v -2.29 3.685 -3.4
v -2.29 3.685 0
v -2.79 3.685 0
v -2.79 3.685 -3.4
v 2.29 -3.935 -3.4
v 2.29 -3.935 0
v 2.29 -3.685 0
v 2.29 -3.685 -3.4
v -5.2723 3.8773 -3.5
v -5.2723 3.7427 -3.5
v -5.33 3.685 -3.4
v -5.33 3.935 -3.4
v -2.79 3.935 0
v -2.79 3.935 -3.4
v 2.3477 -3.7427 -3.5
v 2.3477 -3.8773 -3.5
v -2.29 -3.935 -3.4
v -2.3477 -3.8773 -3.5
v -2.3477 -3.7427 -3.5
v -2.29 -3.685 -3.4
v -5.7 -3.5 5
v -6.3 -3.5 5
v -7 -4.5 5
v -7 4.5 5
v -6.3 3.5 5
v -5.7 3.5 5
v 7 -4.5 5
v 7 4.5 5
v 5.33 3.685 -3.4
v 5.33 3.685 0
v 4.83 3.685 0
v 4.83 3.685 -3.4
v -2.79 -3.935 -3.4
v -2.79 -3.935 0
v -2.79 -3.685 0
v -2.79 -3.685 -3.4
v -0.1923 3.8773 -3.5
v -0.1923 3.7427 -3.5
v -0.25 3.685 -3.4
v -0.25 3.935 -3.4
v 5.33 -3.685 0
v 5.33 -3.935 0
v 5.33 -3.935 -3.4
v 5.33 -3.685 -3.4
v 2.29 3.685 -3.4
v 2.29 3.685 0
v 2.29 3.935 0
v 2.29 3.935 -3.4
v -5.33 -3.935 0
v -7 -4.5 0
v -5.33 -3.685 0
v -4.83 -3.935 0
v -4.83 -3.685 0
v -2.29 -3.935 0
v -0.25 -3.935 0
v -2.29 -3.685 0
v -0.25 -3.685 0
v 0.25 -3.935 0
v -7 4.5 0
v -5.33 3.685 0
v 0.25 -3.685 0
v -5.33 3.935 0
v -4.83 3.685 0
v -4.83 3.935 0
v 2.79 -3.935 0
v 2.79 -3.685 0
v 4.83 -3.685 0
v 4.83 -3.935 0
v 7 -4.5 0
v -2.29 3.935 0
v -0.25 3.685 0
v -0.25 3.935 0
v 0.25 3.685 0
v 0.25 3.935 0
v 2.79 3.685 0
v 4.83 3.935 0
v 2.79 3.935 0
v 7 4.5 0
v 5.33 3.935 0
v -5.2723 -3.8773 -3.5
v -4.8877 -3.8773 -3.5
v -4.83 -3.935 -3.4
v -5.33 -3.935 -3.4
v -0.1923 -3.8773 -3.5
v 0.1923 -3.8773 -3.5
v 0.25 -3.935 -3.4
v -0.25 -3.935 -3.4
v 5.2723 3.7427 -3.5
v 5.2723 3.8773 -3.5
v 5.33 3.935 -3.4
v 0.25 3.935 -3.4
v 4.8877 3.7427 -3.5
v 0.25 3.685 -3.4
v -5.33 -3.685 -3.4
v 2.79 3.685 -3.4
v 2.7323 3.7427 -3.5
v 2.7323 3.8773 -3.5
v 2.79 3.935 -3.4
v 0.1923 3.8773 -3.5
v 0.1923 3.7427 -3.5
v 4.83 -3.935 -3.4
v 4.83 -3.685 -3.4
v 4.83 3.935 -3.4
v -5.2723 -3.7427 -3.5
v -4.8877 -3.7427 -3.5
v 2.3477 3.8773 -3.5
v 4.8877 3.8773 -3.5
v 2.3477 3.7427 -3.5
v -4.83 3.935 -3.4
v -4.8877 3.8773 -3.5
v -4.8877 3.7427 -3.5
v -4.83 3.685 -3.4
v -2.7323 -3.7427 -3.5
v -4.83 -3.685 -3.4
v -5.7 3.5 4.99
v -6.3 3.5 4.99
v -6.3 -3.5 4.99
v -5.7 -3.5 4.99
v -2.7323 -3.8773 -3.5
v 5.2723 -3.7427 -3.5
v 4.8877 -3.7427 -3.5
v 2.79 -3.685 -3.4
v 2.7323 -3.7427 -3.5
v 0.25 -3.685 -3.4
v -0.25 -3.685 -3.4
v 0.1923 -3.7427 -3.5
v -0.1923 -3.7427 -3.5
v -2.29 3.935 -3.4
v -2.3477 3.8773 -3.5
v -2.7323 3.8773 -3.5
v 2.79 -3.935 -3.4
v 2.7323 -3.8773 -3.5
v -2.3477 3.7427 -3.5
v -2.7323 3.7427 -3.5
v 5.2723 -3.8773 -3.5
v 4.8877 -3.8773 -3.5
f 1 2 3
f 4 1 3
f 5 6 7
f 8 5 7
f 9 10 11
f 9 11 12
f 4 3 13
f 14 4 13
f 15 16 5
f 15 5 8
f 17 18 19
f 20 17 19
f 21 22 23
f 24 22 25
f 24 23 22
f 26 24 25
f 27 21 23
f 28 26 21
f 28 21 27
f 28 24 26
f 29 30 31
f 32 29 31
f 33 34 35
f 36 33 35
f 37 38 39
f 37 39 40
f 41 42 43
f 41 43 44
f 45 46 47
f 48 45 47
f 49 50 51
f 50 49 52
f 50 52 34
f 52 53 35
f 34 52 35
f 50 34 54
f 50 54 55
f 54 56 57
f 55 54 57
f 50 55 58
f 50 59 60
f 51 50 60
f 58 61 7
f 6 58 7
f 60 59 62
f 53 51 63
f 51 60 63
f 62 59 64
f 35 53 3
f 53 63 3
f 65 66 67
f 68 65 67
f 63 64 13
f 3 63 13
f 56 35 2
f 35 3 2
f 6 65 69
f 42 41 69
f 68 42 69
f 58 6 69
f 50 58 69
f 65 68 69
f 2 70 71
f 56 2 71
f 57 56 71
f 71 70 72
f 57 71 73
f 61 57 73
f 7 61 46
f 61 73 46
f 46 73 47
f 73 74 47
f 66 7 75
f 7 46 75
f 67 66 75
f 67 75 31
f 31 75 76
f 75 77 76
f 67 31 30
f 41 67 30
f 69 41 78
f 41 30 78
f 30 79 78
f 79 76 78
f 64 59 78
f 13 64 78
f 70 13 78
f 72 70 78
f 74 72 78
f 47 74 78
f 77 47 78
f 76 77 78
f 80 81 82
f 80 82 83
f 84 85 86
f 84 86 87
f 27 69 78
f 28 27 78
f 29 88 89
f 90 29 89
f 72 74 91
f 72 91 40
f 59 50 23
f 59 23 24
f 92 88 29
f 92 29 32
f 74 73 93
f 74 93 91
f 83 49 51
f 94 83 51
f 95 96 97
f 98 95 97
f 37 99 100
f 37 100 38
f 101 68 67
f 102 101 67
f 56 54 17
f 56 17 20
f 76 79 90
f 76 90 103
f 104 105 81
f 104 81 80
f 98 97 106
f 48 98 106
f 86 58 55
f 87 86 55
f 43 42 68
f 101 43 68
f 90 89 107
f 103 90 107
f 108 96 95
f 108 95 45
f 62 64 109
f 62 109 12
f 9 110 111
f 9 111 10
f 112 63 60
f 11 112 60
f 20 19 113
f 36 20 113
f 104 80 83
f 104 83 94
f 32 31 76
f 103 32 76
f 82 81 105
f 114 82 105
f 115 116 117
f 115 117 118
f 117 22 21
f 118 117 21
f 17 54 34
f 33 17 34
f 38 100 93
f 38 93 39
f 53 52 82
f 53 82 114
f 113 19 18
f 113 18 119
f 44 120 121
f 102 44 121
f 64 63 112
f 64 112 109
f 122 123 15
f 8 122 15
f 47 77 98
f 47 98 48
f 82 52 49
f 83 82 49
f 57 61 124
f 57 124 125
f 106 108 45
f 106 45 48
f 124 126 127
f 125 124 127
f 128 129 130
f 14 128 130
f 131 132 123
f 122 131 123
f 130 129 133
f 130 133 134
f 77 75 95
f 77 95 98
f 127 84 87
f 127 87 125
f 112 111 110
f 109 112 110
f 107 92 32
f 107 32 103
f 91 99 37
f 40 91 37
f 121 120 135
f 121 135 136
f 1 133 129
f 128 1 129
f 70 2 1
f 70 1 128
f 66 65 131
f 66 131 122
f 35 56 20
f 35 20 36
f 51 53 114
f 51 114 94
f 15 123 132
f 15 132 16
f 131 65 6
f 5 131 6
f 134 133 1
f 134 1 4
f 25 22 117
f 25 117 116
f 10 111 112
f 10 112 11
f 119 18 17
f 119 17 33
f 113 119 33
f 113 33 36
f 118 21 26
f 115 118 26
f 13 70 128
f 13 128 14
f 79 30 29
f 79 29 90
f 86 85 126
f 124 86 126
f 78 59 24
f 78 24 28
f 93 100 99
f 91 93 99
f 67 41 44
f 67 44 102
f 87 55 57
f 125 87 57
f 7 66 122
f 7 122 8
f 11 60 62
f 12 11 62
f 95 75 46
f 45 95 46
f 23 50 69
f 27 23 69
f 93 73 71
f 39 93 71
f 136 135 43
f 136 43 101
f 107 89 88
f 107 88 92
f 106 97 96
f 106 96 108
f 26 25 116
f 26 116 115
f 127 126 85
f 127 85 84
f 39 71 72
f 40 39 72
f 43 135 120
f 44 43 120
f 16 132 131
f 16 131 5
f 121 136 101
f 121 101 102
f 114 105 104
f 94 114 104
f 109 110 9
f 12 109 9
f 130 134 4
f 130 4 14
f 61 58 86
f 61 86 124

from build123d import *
from OCP.BRepFilletAPI import BRepFilletAPI_MakeChamfer

# Parameters (mm, degrees)
SKETCH_1_W                          = 14
SKETCH_1_H                          = 9
EXTRUDE_1_DEPTH                     = 5
SKETCH_3_W                          = 0.6
SKETCH_3_H                          = 7
CUT_EXTRUDE_1_DEPTH                 = 0.01
SKETCH_4_W                          = 0.5
SKETCH_4_H                          = 0.25
EXTRUDE_2_DEPTH                     = 3.5
CHAMFER_1_SIZE                      = 0.1
CHAMFER_1_SIZE2                     = 0.057735027
PATTERN_LINEAR_1_COUNT              = 5
PATTERN_LINEAR_1_PITCH              = 2.54
PATTERN_LINEAR_1_COUNT_DIR2         = 2
PATTERN_LINEAR_1_PITCH_DIR2         = 7.62
CHAMFER_1_OF_PATTERN_LINEAR_1_SIZE  = 0.1
CHAMFER_1_OF_PATTERN_LINEAR_1_SIZE2 = 0.057735027


with BuildPart() as part:
    # Эскиз1 → Бобышка-Вытянуть1 (new body)
    with BuildSketch(Plane.XY):
        Rectangle(SKETCH_1_W, SKETCH_1_H)
    extrude(amount=EXTRUDE_1_DEPTH)

    # Эскиз3 → Вырез-Вытянуть1 (cut)
    with BuildSketch(Plane.XY.offset(5)):
        with Locations((-6, 0)):
            Rectangle(SKETCH_3_W, SKETCH_3_H)
    extrude(amount=-CUT_EXTRUDE_1_DEPTH, mode=Mode.SUBTRACT)

    # Эскиз4 → Бобышка-Вытянуть2 (add)
    with BuildSketch(Plane(origin=(0, 0, 0), x_dir=(-1, 0, 0), z_dir=(0, 0, -1))):
        with Locations((5.08, -3.81)):
            Rectangle(SKETCH_4_W, SKETCH_4_H)
    extrude_2 = extrude(amount=EXTRUDE_2_DEPTH)

    # Фаска1: one chamfer whose edges measure the first distance from different faces: ONE call of the kernel's chamfer builder (chamfer() names one face for all edges)
    chamfer_1_edges_1 = [part.edges().sort_by_distance(p)[0] for p in [
        (-4.83, -3.81, -3.5),
    ]]
    chamfer_1_side_1 = [part.faces().sort_by_distance(p)[0] for p in [
        (-4.83, -3.81, -1.75),
    ]]
    chamfer_1_edges_2 = [part.edges().sort_by_distance(p)[0] for p in [
        (-5.08, -3.935, -3.5),
    ]]
    chamfer_1_side_2 = [part.faces().sort_by_distance(p)[0] for p in [
        (-5.08, -3.935, -1.75),
    ]]
    chamfer_1_edges_3 = [part.edges().sort_by_distance(p)[0] for p in [
        (-5.33, -3.81, -3.5),
    ]]
    chamfer_1_side_3 = [part.faces().sort_by_distance(p)[0] for p in [
        (-5.33, -3.81, -1.75),
    ]]
    chamfer_1_edges_4 = [part.edges().sort_by_distance(p)[0] for p in [
        (-5.08, -3.685, -3.5),
    ]]
    chamfer_1_side_4 = [part.faces().sort_by_distance(p)[0] for p in [
        (-5.08, -3.685, -1.75),
    ]]
    chamfer_1 = BRepFilletAPI_MakeChamfer(part.part.solid().wrapped)
    for e in chamfer_1_edges_1:
        chamfer_1.Add(CHAMFER_1_SIZE, CHAMFER_1_SIZE2, e.wrapped, chamfer_1_side_1[0].wrapped)  # the first distance lies on this face
    for e in chamfer_1_edges_2:
        chamfer_1.Add(CHAMFER_1_SIZE, CHAMFER_1_SIZE2, e.wrapped, chamfer_1_side_2[0].wrapped)  # the first distance lies on this face
    for e in chamfer_1_edges_3:
        chamfer_1.Add(CHAMFER_1_SIZE, CHAMFER_1_SIZE2, e.wrapped, chamfer_1_side_3[0].wrapped)  # the first distance lies on this face
    for e in chamfer_1_edges_4:
        chamfer_1.Add(CHAMFER_1_SIZE, CHAMFER_1_SIZE2, e.wrapped, chamfer_1_side_4[0].wrapped)  # the first distance lies on this face
    add(Compound.cast(chamfer_1.Shape()), mode=Mode.REPLACE)

    # Линейный массив1: Extrude 2 5 × 2
    with Locations(*[(i * PATTERN_LINEAR_1_PITCH, j * PATTERN_LINEAR_1_PITCH_DIR2, 0) for i in range(PATTERN_LINEAR_1_COUNT) for j in range(PATTERN_LINEAR_1_COUNT_DIR2) if (i, j) != (0, 0)]):
        add(extrude_2)

    # Фаска1 of Линейный массив1: one chamfer whose edges measure the first distance from different faces: ONE call of the kernel's chamfer builder (chamfer() names one face for all edges)
    chamfer_1_of_pattern_linear_1_edges_1 = [part.edges().sort_by_distance(p)[0] for p in [
        (-4.83, 3.81, -3.5),
    ]]
    chamfer_1_of_pattern_linear_1_side_1 = [part.faces().sort_by_distance(p)[0] for p in [
        (-4.83, 3.81, -1.75),
    ]]
    chamfer_1_of_pattern_linear_1_edges_2 = [part.edges().sort_by_distance(p)[0] for p in [
        (-5.08, 3.685, -3.5),
    ]]
    chamfer_1_of_pattern_linear_1_side_2 = [part.faces().sort_by_distance(p)[0] for p in [
        (-5.08, 3.685, -1.75),
    ]]
    chamfer_1_of_pattern_linear_1_edges_3 = [part.edges().sort_by_distance(p)[0] for p in [
        (-5.33, 3.81, -3.5),
    ]]
    chamfer_1_of_pattern_linear_1_side_3 = [part.faces().sort_by_distance(p)[0] for p in [
        (-5.33, 3.81, -1.75),
    ]]
    chamfer_1_of_pattern_linear_1_edges_4 = [part.edges().sort_by_distance(p)[0] for p in [
        (-5.08, 3.935, -3.5),
    ]]
    chamfer_1_of_pattern_linear_1_side_4 = [part.faces().sort_by_distance(p)[0] for p in [
        (-5.08, 3.935, -1.75),
    ]]
    chamfer_1_of_pattern_linear_1_edges_5 = [part.edges().sort_by_distance(p)[0] for p in [
        (-2.29, -3.81, -3.5),
    ]]
    chamfer_1_of_pattern_linear_1_side_5 = [part.faces().sort_by_distance(p)[0] for p in [
        (-2.29, -3.81, -1.75),
    ]]
    chamfer_1_of_pattern_linear_1_edges_6 = [part.edges().sort_by_distance(p)[0] for p in [
        (-2.54, -3.935, -3.5),
    ]]
    chamfer_1_of_pattern_linear_1_side_6 = [part.faces().sort_by_distance(p)[0] for p in [
        (-2.54, -3.935, -1.75),
    ]]
    chamfer_1_of_pattern_linear_1_edges_7 = [part.edges().sort_by_distance(p)[0] for p in [
        (-2.79, -3.81, -3.5),
    ]]
    chamfer_1_of_pattern_linear_1_side_7 = [part.faces().sort_by_distance(p)[0] for p in [
        (-2.79, -3.81, -1.75),
    ]]
    chamfer_1_of_pattern_linear_1_edges_8 = [part.edges().sort_by_distance(p)[0] for p in [
        (-2.54, -3.685, -3.5),
    ]]
    chamfer_1_of_pattern_linear_1_side_8 = [part.faces().sort_by_distance(p)[0] for p in [
        (-2.54, -3.685, -1.75),
    ]]
    chamfer_1_of_pattern_linear_1_edges_9 = [part.edges().sort_by_distance(p)[0] for p in [
        (-2.29, 3.81, -3.5),
    ]]
    chamfer_1_of_pattern_linear_1_side_9 = [part.faces().sort_by_distance(p)[0] for p in [
        (-2.29, 3.81, -1.75),
    ]]
    chamfer_1_of_pattern_linear_1_edges_10 = [part.edges().sort_by_distance(p)[0] for p in [
        (-2.54, 3.685, -3.5),
    ]]
    chamfer_1_of_pattern_linear_1_side_10 = [part.faces().sort_by_distance(p)[0] for p in [
        (-2.54, 3.685, -1.75),
    ]]
    chamfer_1_of_pattern_linear_1_edges_11 = [part.edges().sort_by_distance(p)[0] for p in [
        (-2.79, 3.81, -3.5),
    ]]
    chamfer_1_of_pattern_linear_1_side_11 = [part.faces().sort_by_distance(p)[0] for p in [
        (-2.79, 3.81, -1.75),
    ]]
    chamfer_1_of_pattern_linear_1_edges_12 = [part.edges().sort_by_distance(p)[0] for p in [
        (-2.54, 3.935, -3.5),
    ]]
    chamfer_1_of_pattern_linear_1_side_12 = [part.faces().sort_by_distance(p)[0] for p in [
        (-2.54, 3.935, -1.75),
    ]]
    chamfer_1_of_pattern_linear_1_edges_13 = [part.edges().sort_by_distance(p)[0] for p in [
        (0.25, -3.81, -3.5),
    ]]
    chamfer_1_of_pattern_linear_1_side_13 = [part.faces().sort_by_distance(p)[0] for p in [
        (0.25, -3.81, -1.75),
    ]]
    chamfer_1_of_pattern_linear_1_edges_14 = [part.edges().sort_by_distance(p)[0] for p in [
        (0, -3.935, -3.5),
    ]]
    chamfer_1_of_pattern_linear_1_side_14 = [part.faces().sort_by_distance(p)[0] for p in [
        (0, -3.935, -1.75),
    ]]
    chamfer_1_of_pattern_linear_1_edges_15 = [part.edges().sort_by_distance(p)[0] for p in [
        (-0.25, -3.81, -3.5),
    ]]
    chamfer_1_of_pattern_linear_1_side_15 = [part.faces().sort_by_distance(p)[0] for p in [
        (-0.25, -3.81, -1.75),
    ]]
    chamfer_1_of_pattern_linear_1_edges_16 = [part.edges().sort_by_distance(p)[0] for p in [
        (0, -3.685, -3.5),
    ]]
    chamfer_1_of_pattern_linear_1_side_16 = [part.faces().sort_by_distance(p)[0] for p in [
        (0, -3.685, -1.75),
    ]]
    chamfer_1_of_pattern_linear_1_edges_17 = [part.edges().sort_by_distance(p)[0] for p in [
        (0.25, 3.81, -3.5),
    ]]
    chamfer_1_of_pattern_linear_1_side_17 = [part.faces().sort_by_distance(p)[0] for p in [
        (0.25, 3.81, -1.75),
    ]]
    chamfer_1_of_pattern_linear_1_edges_18 = [part.edges().sort_by_distance(p)[0] for p in [
        (0, 3.685, -3.5),
    ]]
    chamfer_1_of_pattern_linear_1_side_18 = [part.faces().sort_by_distance(p)[0] for p in [
        (0, 3.685, -1.75),
    ]]
    chamfer_1_of_pattern_linear_1_edges_19 = [part.edges().sort_by_distance(p)[0] for p in [
        (-0.25, 3.81, -3.5),
    ]]
    chamfer_1_of_pattern_linear_1_side_19 = [part.faces().sort_by_distance(p)[0] for p in [
        (-0.25, 3.81, -1.75),
    ]]
    chamfer_1_of_pattern_linear_1_edges_20 = [part.edges().sort_by_distance(p)[0] for p in [
        (0, 3.935, -3.5),
    ]]
    chamfer_1_of_pattern_linear_1_side_20 = [part.faces().sort_by_distance(p)[0] for p in [
        (0, 3.935, -1.75),
    ]]
    chamfer_1_of_pattern_linear_1_edges_21 = [part.edges().sort_by_distance(p)[0] for p in [
        (2.79, -3.81, -3.5),
    ]]
    chamfer_1_of_pattern_linear_1_side_21 = [part.faces().sort_by_distance(p)[0] for p in [
        (2.79, -3.81, -1.75),
    ]]
    chamfer_1_of_pattern_linear_1_edges_22 = [part.edges().sort_by_distance(p)[0] for p in [
        (2.54, -3.935, -3.5),
    ]]
    chamfer_1_of_pattern_linear_1_side_22 = [part.faces().sort_by_distance(p)[0] for p in [
        (2.54, -3.935, -1.75),
    ]]
    chamfer_1_of_pattern_linear_1_edges_23 = [part.edges().sort_by_distance(p)[0] for p in [
        (2.29, -3.81, -3.5),
    ]]
    chamfer_1_of_pattern_linear_1_side_23 = [part.faces().sort_by_distance(p)[0] for p in [
        (2.29, -3.81, -1.75),
    ]]
    chamfer_1_of_pattern_linear_1_edges_24 = [part.edges().sort_by_distance(p)[0] for p in [
        (2.54, -3.685, -3.5),
    ]]
    chamfer_1_of_pattern_linear_1_side_24 = [part.faces().sort_by_distance(p)[0] for p in [
        (2.54, -3.685, -1.75),
    ]]
    chamfer_1_of_pattern_linear_1_edges_25 = [part.edges().sort_by_distance(p)[0] for p in [
        (2.79, 3.81, -3.5),
    ]]
    chamfer_1_of_pattern_linear_1_side_25 = [part.faces().sort_by_distance(p)[0] for p in [
        (2.79, 3.81, -1.75),
    ]]
    chamfer_1_of_pattern_linear_1_edges_26 = [part.edges().sort_by_distance(p)[0] for p in [
        (2.54, 3.685, -3.5),
    ]]
    chamfer_1_of_pattern_linear_1_side_26 = [part.faces().sort_by_distance(p)[0] for p in [
        (2.54, 3.685, -1.75),
    ]]
    chamfer_1_of_pattern_linear_1_edges_27 = [part.edges().sort_by_distance(p)[0] for p in [
        (2.29, 3.81, -3.5),
    ]]
    chamfer_1_of_pattern_linear_1_side_27 = [part.faces().sort_by_distance(p)[0] for p in [
        (2.29, 3.81, -1.75),
    ]]
    chamfer_1_of_pattern_linear_1_edges_28 = [part.edges().sort_by_distance(p)[0] for p in [
        (2.54, 3.935, -3.5),
    ]]
    chamfer_1_of_pattern_linear_1_side_28 = [part.faces().sort_by_distance(p)[0] for p in [
        (2.54, 3.935, -1.75),
    ]]
    chamfer_1_of_pattern_linear_1_edges_29 = [part.edges().sort_by_distance(p)[0] for p in [
        (5.33, -3.81, -3.5),
    ]]
    chamfer_1_of_pattern_linear_1_side_29 = [part.faces().sort_by_distance(p)[0] for p in [
        (5.33, -3.81, -1.75),
    ]]
    chamfer_1_of_pattern_linear_1_edges_30 = [part.edges().sort_by_distance(p)[0] for p in [
        (5.08, -3.935, -3.5),
    ]]
    chamfer_1_of_pattern_linear_1_side_30 = [part.faces().sort_by_distance(p)[0] for p in [
        (5.08, -3.935, -1.75),
    ]]
    chamfer_1_of_pattern_linear_1_edges_31 = [part.edges().sort_by_distance(p)[0] for p in [
        (4.83, -3.81, -3.5),
    ]]
    chamfer_1_of_pattern_linear_1_side_31 = [part.faces().sort_by_distance(p)[0] for p in [
        (4.83, -3.81, -1.75),
    ]]
    chamfer_1_of_pattern_linear_1_edges_32 = [part.edges().sort_by_distance(p)[0] for p in [
        (5.08, -3.685, -3.5),
    ]]
    chamfer_1_of_pattern_linear_1_side_32 = [part.faces().sort_by_distance(p)[0] for p in [
        (5.08, -3.685, -1.75),
    ]]
    chamfer_1_of_pattern_linear_1_edges_33 = [part.edges().sort_by_distance(p)[0] for p in [
        (5.33, 3.81, -3.5),
    ]]
    chamfer_1_of_pattern_linear_1_side_33 = [part.faces().sort_by_distance(p)[0] for p in [
        (5.33, 3.81, -1.75),
    ]]
    chamfer_1_of_pattern_linear_1_edges_34 = [part.edges().sort_by_distance(p)[0] for p in [
        (5.08, 3.685, -3.5),
    ]]
    chamfer_1_of_pattern_linear_1_side_34 = [part.faces().sort_by_distance(p)[0] for p in [
        (5.08, 3.685, -1.75),
    ]]
    chamfer_1_of_pattern_linear_1_edges_35 = [part.edges().sort_by_distance(p)[0] for p in [
        (4.83, 3.81, -3.5),
    ]]
    chamfer_1_of_pattern_linear_1_side_35 = [part.faces().sort_by_distance(p)[0] for p in [
        (4.83, 3.81, -1.75),
    ]]
    chamfer_1_of_pattern_linear_1_edges_36 = [part.edges().sort_by_distance(p)[0] for p in [
        (5.08, 3.935, -3.5),
    ]]
    chamfer_1_of_pattern_linear_1_side_36 = [part.faces().sort_by_distance(p)[0] for p in [
        (5.08, 3.935, -1.75),
    ]]
    chamfer_1_of_pattern_linear_1 = BRepFilletAPI_MakeChamfer(part.part.solid().wrapped)
    for e in chamfer_1_of_pattern_linear_1_edges_1:
        chamfer_1_of_pattern_linear_1.Add(CHAMFER_1_OF_PATTERN_LINEAR_1_SIZE, CHAMFER_1_OF_PATTERN_LINEAR_1_SIZE2, e.wrapped, chamfer_1_of_pattern_linear_1_side_1[0].wrapped)  # the first distance lies on this face
    for e in chamfer_1_of_pattern_linear_1_edges_2:
        chamfer_1_of_pattern_linear_1.Add(CHAMFER_1_OF_PATTERN_LINEAR_1_SIZE, CHAMFER_1_OF_PATTERN_LINEAR_1_SIZE2, e.wrapped, chamfer_1_of_pattern_linear_1_side_2[0].wrapped)  # the first distance lies on this face
    for e in chamfer_1_of_pattern_linear_1_edges_3:
        chamfer_1_of_pattern_linear_1.Add(CHAMFER_1_OF_PATTERN_LINEAR_1_SIZE, CHAMFER_1_OF_PATTERN_LINEAR_1_SIZE2, e.wrapped, chamfer_1_of_pattern_linear_1_side_3[0].wrapped)  # the first distance lies on this face
    for e in chamfer_1_of_pattern_linear_1_edges_4:
        chamfer_1_of_pattern_linear_1.Add(CHAMFER_1_OF_PATTERN_LINEAR_1_SIZE, CHAMFER_1_OF_PATTERN_LINEAR_1_SIZE2, e.wrapped, chamfer_1_of_pattern_linear_1_side_4[0].wrapped)  # the first distance lies on this face
    for e in chamfer_1_of_pattern_linear_1_edges_5:
        chamfer_1_of_pattern_linear_1.Add(CHAMFER_1_OF_PATTERN_LINEAR_1_SIZE, CHAMFER_1_OF_PATTERN_LINEAR_1_SIZE2, e.wrapped, chamfer_1_of_pattern_linear_1_side_5[0].wrapped)  # the first distance lies on this face
    for e in chamfer_1_of_pattern_linear_1_edges_6:
        chamfer_1_of_pattern_linear_1.Add(CHAMFER_1_OF_PATTERN_LINEAR_1_SIZE, CHAMFER_1_OF_PATTERN_LINEAR_1_SIZE2, e.wrapped, chamfer_1_of_pattern_linear_1_side_6[0].wrapped)  # the first distance lies on this face
    for e in chamfer_1_of_pattern_linear_1_edges_7:
        chamfer_1_of_pattern_linear_1.Add(CHAMFER_1_OF_PATTERN_LINEAR_1_SIZE, CHAMFER_1_OF_PATTERN_LINEAR_1_SIZE2, e.wrapped, chamfer_1_of_pattern_linear_1_side_7[0].wrapped)  # the first distance lies on this face
    for e in chamfer_1_of_pattern_linear_1_edges_8:
        chamfer_1_of_pattern_linear_1.Add(CHAMFER_1_OF_PATTERN_LINEAR_1_SIZE, CHAMFER_1_OF_PATTERN_LINEAR_1_SIZE2, e.wrapped, chamfer_1_of_pattern_linear_1_side_8[0].wrapped)  # the first distance lies on this face
    for e in chamfer_1_of_pattern_linear_1_edges_9:
        chamfer_1_of_pattern_linear_1.Add(CHAMFER_1_OF_PATTERN_LINEAR_1_SIZE, CHAMFER_1_OF_PATTERN_LINEAR_1_SIZE2, e.wrapped, chamfer_1_of_pattern_linear_1_side_9[0].wrapped)  # the first distance lies on this face
    for e in chamfer_1_of_pattern_linear_1_edges_10:
        chamfer_1_of_pattern_linear_1.Add(CHAMFER_1_OF_PATTERN_LINEAR_1_SIZE, CHAMFER_1_OF_PATTERN_LINEAR_1_SIZE2, e.wrapped, chamfer_1_of_pattern_linear_1_side_10[0].wrapped)  # the first distance lies on this face
    for e in chamfer_1_of_pattern_linear_1_edges_11:
        chamfer_1_of_pattern_linear_1.Add(CHAMFER_1_OF_PATTERN_LINEAR_1_SIZE, CHAMFER_1_OF_PATTERN_LINEAR_1_SIZE2, e.wrapped, chamfer_1_of_pattern_linear_1_side_11[0].wrapped)  # the first distance lies on this face
    for e in chamfer_1_of_pattern_linear_1_edges_12:
        chamfer_1_of_pattern_linear_1.Add(CHAMFER_1_OF_PATTERN_LINEAR_1_SIZE, CHAMFER_1_OF_PATTERN_LINEAR_1_SIZE2, e.wrapped, chamfer_1_of_pattern_linear_1_side_12[0].wrapped)  # the first distance lies on this face
    for e in chamfer_1_of_pattern_linear_1_edges_13:
        chamfer_1_of_pattern_linear_1.Add(CHAMFER_1_OF_PATTERN_LINEAR_1_SIZE, CHAMFER_1_OF_PATTERN_LINEAR_1_SIZE2, e.wrapped, chamfer_1_of_pattern_linear_1_side_13[0].wrapped)  # the first distance lies on this face
    for e in chamfer_1_of_pattern_linear_1_edges_14:
        chamfer_1_of_pattern_linear_1.Add(CHAMFER_1_OF_PATTERN_LINEAR_1_SIZE, CHAMFER_1_OF_PATTERN_LINEAR_1_SIZE2, e.wrapped, chamfer_1_of_pattern_linear_1_side_14[0].wrapped)  # the first distance lies on this face
    for e in chamfer_1_of_pattern_linear_1_edges_15:
        chamfer_1_of_pattern_linear_1.Add(CHAMFER_1_OF_PATTERN_LINEAR_1_SIZE, CHAMFER_1_OF_PATTERN_LINEAR_1_SIZE2, e.wrapped, chamfer_1_of_pattern_linear_1_side_15[0].wrapped)  # the first distance lies on this face
    for e in chamfer_1_of_pattern_linear_1_edges_16:
        chamfer_1_of_pattern_linear_1.Add(CHAMFER_1_OF_PATTERN_LINEAR_1_SIZE, CHAMFER_1_OF_PATTERN_LINEAR_1_SIZE2, e.wrapped, chamfer_1_of_pattern_linear_1_side_16[0].wrapped)  # the first distance lies on this face
    for e in chamfer_1_of_pattern_linear_1_edges_17:
        chamfer_1_of_pattern_linear_1.Add(CHAMFER_1_OF_PATTERN_LINEAR_1_SIZE, CHAMFER_1_OF_PATTERN_LINEAR_1_SIZE2, e.wrapped, chamfer_1_of_pattern_linear_1_side_17[0].wrapped)  # the first distance lies on this face
    for e in chamfer_1_of_pattern_linear_1_edges_18:
        chamfer_1_of_pattern_linear_1.Add(CHAMFER_1_OF_PATTERN_LINEAR_1_SIZE, CHAMFER_1_OF_PATTERN_LINEAR_1_SIZE2, e.wrapped, chamfer_1_of_pattern_linear_1_side_18[0].wrapped)  # the first distance lies on this face
    for e in chamfer_1_of_pattern_linear_1_edges_19:
        chamfer_1_of_pattern_linear_1.Add(CHAMFER_1_OF_PATTERN_LINEAR_1_SIZE, CHAMFER_1_OF_PATTERN_LINEAR_1_SIZE2, e.wrapped, chamfer_1_of_pattern_linear_1_side_19[0].wrapped)  # the first distance lies on this face
    for e in chamfer_1_of_pattern_linear_1_edges_20:
        chamfer_1_of_pattern_linear_1.Add(CHAMFER_1_OF_PATTERN_LINEAR_1_SIZE, CHAMFER_1_OF_PATTERN_LINEAR_1_SIZE2, e.wrapped, chamfer_1_of_pattern_linear_1_side_20[0].wrapped)  # the first distance lies on this face
    for e in chamfer_1_of_pattern_linear_1_edges_21:
        chamfer_1_of_pattern_linear_1.Add(CHAMFER_1_OF_PATTERN_LINEAR_1_SIZE, CHAMFER_1_OF_PATTERN_LINEAR_1_SIZE2, e.wrapped, chamfer_1_of_pattern_linear_1_side_21[0].wrapped)  # the first distance lies on this face
    for e in chamfer_1_of_pattern_linear_1_edges_22:
        chamfer_1_of_pattern_linear_1.Add(CHAMFER_1_OF_PATTERN_LINEAR_1_SIZE, CHAMFER_1_OF_PATTERN_LINEAR_1_SIZE2, e.wrapped, chamfer_1_of_pattern_linear_1_side_22[0].wrapped)  # the first distance lies on this face
    for e in chamfer_1_of_pattern_linear_1_edges_23:
        chamfer_1_of_pattern_linear_1.Add(CHAMFER_1_OF_PATTERN_LINEAR_1_SIZE, CHAMFER_1_OF_PATTERN_LINEAR_1_SIZE2, e.wrapped, chamfer_1_of_pattern_linear_1_side_23[0].wrapped)  # the first distance lies on this face
    for e in chamfer_1_of_pattern_linear_1_edges_24:
        chamfer_1_of_pattern_linear_1.Add(CHAMFER_1_OF_PATTERN_LINEAR_1_SIZE, CHAMFER_1_OF_PATTERN_LINEAR_1_SIZE2, e.wrapped, chamfer_1_of_pattern_linear_1_side_24[0].wrapped)  # the first distance lies on this face
    for e in chamfer_1_of_pattern_linear_1_edges_25:
        chamfer_1_of_pattern_linear_1.Add(CHAMFER_1_OF_PATTERN_LINEAR_1_SIZE, CHAMFER_1_OF_PATTERN_LINEAR_1_SIZE2, e.wrapped, chamfer_1_of_pattern_linear_1_side_25[0].wrapped)  # the first distance lies on this face
    for e in chamfer_1_of_pattern_linear_1_edges_26:
        chamfer_1_of_pattern_linear_1.Add(CHAMFER_1_OF_PATTERN_LINEAR_1_SIZE, CHAMFER_1_OF_PATTERN_LINEAR_1_SIZE2, e.wrapped, chamfer_1_of_pattern_linear_1_side_26[0].wrapped)  # the first distance lies on this face
    for e in chamfer_1_of_pattern_linear_1_edges_27:
        chamfer_1_of_pattern_linear_1.Add(CHAMFER_1_OF_PATTERN_LINEAR_1_SIZE, CHAMFER_1_OF_PATTERN_LINEAR_1_SIZE2, e.wrapped, chamfer_1_of_pattern_linear_1_side_27[0].wrapped)  # the first distance lies on this face
    for e in chamfer_1_of_pattern_linear_1_edges_28:
        chamfer_1_of_pattern_linear_1.Add(CHAMFER_1_OF_PATTERN_LINEAR_1_SIZE, CHAMFER_1_OF_PATTERN_LINEAR_1_SIZE2, e.wrapped, chamfer_1_of_pattern_linear_1_side_28[0].wrapped)  # the first distance lies on this face
    for e in chamfer_1_of_pattern_linear_1_edges_29:
        chamfer_1_of_pattern_linear_1.Add(CHAMFER_1_OF_PATTERN_LINEAR_1_SIZE, CHAMFER_1_OF_PATTERN_LINEAR_1_SIZE2, e.wrapped, chamfer_1_of_pattern_linear_1_side_29[0].wrapped)  # the first distance lies on this face
    for e in chamfer_1_of_pattern_linear_1_edges_30:
        chamfer_1_of_pattern_linear_1.Add(CHAMFER_1_OF_PATTERN_LINEAR_1_SIZE, CHAMFER_1_OF_PATTERN_LINEAR_1_SIZE2, e.wrapped, chamfer_1_of_pattern_linear_1_side_30[0].wrapped)  # the first distance lies on this face
    for e in chamfer_1_of_pattern_linear_1_edges_31:
        chamfer_1_of_pattern_linear_1.Add(CHAMFER_1_OF_PATTERN_LINEAR_1_SIZE, CHAMFER_1_OF_PATTERN_LINEAR_1_SIZE2, e.wrapped, chamfer_1_of_pattern_linear_1_side_31[0].wrapped)  # the first distance lies on this face
    for e in chamfer_1_of_pattern_linear_1_edges_32:
        chamfer_1_of_pattern_linear_1.Add(CHAMFER_1_OF_PATTERN_LINEAR_1_SIZE, CHAMFER_1_OF_PATTERN_LINEAR_1_SIZE2, e.wrapped, chamfer_1_of_pattern_linear_1_side_32[0].wrapped)  # the first distance lies on this face
    for e in chamfer_1_of_pattern_linear_1_edges_33:
        chamfer_1_of_pattern_linear_1.Add(CHAMFER_1_OF_PATTERN_LINEAR_1_SIZE, CHAMFER_1_OF_PATTERN_LINEAR_1_SIZE2, e.wrapped, chamfer_1_of_pattern_linear_1_side_33[0].wrapped)  # the first distance lies on this face
    for e in chamfer_1_of_pattern_linear_1_edges_34:
        chamfer_1_of_pattern_linear_1.Add(CHAMFER_1_OF_PATTERN_LINEAR_1_SIZE, CHAMFER_1_OF_PATTERN_LINEAR_1_SIZE2, e.wrapped, chamfer_1_of_pattern_linear_1_side_34[0].wrapped)  # the first distance lies on this face
    for e in chamfer_1_of_pattern_linear_1_edges_35:
        chamfer_1_of_pattern_linear_1.Add(CHAMFER_1_OF_PATTERN_LINEAR_1_SIZE, CHAMFER_1_OF_PATTERN_LINEAR_1_SIZE2, e.wrapped, chamfer_1_of_pattern_linear_1_side_35[0].wrapped)  # the first distance lies on this face
    for e in chamfer_1_of_pattern_linear_1_edges_36:
        chamfer_1_of_pattern_linear_1.Add(CHAMFER_1_OF_PATTERN_LINEAR_1_SIZE, CHAMFER_1_OF_PATTERN_LINEAR_1_SIZE2, e.wrapped, chamfer_1_of_pattern_linear_1_side_36[0].wrapped)  # the first distance lies on this face
    add(Compound.cast(chamfer_1_of_pattern_linear_1.Shape()), mode=Mode.REPLACE)


solid = part.part
